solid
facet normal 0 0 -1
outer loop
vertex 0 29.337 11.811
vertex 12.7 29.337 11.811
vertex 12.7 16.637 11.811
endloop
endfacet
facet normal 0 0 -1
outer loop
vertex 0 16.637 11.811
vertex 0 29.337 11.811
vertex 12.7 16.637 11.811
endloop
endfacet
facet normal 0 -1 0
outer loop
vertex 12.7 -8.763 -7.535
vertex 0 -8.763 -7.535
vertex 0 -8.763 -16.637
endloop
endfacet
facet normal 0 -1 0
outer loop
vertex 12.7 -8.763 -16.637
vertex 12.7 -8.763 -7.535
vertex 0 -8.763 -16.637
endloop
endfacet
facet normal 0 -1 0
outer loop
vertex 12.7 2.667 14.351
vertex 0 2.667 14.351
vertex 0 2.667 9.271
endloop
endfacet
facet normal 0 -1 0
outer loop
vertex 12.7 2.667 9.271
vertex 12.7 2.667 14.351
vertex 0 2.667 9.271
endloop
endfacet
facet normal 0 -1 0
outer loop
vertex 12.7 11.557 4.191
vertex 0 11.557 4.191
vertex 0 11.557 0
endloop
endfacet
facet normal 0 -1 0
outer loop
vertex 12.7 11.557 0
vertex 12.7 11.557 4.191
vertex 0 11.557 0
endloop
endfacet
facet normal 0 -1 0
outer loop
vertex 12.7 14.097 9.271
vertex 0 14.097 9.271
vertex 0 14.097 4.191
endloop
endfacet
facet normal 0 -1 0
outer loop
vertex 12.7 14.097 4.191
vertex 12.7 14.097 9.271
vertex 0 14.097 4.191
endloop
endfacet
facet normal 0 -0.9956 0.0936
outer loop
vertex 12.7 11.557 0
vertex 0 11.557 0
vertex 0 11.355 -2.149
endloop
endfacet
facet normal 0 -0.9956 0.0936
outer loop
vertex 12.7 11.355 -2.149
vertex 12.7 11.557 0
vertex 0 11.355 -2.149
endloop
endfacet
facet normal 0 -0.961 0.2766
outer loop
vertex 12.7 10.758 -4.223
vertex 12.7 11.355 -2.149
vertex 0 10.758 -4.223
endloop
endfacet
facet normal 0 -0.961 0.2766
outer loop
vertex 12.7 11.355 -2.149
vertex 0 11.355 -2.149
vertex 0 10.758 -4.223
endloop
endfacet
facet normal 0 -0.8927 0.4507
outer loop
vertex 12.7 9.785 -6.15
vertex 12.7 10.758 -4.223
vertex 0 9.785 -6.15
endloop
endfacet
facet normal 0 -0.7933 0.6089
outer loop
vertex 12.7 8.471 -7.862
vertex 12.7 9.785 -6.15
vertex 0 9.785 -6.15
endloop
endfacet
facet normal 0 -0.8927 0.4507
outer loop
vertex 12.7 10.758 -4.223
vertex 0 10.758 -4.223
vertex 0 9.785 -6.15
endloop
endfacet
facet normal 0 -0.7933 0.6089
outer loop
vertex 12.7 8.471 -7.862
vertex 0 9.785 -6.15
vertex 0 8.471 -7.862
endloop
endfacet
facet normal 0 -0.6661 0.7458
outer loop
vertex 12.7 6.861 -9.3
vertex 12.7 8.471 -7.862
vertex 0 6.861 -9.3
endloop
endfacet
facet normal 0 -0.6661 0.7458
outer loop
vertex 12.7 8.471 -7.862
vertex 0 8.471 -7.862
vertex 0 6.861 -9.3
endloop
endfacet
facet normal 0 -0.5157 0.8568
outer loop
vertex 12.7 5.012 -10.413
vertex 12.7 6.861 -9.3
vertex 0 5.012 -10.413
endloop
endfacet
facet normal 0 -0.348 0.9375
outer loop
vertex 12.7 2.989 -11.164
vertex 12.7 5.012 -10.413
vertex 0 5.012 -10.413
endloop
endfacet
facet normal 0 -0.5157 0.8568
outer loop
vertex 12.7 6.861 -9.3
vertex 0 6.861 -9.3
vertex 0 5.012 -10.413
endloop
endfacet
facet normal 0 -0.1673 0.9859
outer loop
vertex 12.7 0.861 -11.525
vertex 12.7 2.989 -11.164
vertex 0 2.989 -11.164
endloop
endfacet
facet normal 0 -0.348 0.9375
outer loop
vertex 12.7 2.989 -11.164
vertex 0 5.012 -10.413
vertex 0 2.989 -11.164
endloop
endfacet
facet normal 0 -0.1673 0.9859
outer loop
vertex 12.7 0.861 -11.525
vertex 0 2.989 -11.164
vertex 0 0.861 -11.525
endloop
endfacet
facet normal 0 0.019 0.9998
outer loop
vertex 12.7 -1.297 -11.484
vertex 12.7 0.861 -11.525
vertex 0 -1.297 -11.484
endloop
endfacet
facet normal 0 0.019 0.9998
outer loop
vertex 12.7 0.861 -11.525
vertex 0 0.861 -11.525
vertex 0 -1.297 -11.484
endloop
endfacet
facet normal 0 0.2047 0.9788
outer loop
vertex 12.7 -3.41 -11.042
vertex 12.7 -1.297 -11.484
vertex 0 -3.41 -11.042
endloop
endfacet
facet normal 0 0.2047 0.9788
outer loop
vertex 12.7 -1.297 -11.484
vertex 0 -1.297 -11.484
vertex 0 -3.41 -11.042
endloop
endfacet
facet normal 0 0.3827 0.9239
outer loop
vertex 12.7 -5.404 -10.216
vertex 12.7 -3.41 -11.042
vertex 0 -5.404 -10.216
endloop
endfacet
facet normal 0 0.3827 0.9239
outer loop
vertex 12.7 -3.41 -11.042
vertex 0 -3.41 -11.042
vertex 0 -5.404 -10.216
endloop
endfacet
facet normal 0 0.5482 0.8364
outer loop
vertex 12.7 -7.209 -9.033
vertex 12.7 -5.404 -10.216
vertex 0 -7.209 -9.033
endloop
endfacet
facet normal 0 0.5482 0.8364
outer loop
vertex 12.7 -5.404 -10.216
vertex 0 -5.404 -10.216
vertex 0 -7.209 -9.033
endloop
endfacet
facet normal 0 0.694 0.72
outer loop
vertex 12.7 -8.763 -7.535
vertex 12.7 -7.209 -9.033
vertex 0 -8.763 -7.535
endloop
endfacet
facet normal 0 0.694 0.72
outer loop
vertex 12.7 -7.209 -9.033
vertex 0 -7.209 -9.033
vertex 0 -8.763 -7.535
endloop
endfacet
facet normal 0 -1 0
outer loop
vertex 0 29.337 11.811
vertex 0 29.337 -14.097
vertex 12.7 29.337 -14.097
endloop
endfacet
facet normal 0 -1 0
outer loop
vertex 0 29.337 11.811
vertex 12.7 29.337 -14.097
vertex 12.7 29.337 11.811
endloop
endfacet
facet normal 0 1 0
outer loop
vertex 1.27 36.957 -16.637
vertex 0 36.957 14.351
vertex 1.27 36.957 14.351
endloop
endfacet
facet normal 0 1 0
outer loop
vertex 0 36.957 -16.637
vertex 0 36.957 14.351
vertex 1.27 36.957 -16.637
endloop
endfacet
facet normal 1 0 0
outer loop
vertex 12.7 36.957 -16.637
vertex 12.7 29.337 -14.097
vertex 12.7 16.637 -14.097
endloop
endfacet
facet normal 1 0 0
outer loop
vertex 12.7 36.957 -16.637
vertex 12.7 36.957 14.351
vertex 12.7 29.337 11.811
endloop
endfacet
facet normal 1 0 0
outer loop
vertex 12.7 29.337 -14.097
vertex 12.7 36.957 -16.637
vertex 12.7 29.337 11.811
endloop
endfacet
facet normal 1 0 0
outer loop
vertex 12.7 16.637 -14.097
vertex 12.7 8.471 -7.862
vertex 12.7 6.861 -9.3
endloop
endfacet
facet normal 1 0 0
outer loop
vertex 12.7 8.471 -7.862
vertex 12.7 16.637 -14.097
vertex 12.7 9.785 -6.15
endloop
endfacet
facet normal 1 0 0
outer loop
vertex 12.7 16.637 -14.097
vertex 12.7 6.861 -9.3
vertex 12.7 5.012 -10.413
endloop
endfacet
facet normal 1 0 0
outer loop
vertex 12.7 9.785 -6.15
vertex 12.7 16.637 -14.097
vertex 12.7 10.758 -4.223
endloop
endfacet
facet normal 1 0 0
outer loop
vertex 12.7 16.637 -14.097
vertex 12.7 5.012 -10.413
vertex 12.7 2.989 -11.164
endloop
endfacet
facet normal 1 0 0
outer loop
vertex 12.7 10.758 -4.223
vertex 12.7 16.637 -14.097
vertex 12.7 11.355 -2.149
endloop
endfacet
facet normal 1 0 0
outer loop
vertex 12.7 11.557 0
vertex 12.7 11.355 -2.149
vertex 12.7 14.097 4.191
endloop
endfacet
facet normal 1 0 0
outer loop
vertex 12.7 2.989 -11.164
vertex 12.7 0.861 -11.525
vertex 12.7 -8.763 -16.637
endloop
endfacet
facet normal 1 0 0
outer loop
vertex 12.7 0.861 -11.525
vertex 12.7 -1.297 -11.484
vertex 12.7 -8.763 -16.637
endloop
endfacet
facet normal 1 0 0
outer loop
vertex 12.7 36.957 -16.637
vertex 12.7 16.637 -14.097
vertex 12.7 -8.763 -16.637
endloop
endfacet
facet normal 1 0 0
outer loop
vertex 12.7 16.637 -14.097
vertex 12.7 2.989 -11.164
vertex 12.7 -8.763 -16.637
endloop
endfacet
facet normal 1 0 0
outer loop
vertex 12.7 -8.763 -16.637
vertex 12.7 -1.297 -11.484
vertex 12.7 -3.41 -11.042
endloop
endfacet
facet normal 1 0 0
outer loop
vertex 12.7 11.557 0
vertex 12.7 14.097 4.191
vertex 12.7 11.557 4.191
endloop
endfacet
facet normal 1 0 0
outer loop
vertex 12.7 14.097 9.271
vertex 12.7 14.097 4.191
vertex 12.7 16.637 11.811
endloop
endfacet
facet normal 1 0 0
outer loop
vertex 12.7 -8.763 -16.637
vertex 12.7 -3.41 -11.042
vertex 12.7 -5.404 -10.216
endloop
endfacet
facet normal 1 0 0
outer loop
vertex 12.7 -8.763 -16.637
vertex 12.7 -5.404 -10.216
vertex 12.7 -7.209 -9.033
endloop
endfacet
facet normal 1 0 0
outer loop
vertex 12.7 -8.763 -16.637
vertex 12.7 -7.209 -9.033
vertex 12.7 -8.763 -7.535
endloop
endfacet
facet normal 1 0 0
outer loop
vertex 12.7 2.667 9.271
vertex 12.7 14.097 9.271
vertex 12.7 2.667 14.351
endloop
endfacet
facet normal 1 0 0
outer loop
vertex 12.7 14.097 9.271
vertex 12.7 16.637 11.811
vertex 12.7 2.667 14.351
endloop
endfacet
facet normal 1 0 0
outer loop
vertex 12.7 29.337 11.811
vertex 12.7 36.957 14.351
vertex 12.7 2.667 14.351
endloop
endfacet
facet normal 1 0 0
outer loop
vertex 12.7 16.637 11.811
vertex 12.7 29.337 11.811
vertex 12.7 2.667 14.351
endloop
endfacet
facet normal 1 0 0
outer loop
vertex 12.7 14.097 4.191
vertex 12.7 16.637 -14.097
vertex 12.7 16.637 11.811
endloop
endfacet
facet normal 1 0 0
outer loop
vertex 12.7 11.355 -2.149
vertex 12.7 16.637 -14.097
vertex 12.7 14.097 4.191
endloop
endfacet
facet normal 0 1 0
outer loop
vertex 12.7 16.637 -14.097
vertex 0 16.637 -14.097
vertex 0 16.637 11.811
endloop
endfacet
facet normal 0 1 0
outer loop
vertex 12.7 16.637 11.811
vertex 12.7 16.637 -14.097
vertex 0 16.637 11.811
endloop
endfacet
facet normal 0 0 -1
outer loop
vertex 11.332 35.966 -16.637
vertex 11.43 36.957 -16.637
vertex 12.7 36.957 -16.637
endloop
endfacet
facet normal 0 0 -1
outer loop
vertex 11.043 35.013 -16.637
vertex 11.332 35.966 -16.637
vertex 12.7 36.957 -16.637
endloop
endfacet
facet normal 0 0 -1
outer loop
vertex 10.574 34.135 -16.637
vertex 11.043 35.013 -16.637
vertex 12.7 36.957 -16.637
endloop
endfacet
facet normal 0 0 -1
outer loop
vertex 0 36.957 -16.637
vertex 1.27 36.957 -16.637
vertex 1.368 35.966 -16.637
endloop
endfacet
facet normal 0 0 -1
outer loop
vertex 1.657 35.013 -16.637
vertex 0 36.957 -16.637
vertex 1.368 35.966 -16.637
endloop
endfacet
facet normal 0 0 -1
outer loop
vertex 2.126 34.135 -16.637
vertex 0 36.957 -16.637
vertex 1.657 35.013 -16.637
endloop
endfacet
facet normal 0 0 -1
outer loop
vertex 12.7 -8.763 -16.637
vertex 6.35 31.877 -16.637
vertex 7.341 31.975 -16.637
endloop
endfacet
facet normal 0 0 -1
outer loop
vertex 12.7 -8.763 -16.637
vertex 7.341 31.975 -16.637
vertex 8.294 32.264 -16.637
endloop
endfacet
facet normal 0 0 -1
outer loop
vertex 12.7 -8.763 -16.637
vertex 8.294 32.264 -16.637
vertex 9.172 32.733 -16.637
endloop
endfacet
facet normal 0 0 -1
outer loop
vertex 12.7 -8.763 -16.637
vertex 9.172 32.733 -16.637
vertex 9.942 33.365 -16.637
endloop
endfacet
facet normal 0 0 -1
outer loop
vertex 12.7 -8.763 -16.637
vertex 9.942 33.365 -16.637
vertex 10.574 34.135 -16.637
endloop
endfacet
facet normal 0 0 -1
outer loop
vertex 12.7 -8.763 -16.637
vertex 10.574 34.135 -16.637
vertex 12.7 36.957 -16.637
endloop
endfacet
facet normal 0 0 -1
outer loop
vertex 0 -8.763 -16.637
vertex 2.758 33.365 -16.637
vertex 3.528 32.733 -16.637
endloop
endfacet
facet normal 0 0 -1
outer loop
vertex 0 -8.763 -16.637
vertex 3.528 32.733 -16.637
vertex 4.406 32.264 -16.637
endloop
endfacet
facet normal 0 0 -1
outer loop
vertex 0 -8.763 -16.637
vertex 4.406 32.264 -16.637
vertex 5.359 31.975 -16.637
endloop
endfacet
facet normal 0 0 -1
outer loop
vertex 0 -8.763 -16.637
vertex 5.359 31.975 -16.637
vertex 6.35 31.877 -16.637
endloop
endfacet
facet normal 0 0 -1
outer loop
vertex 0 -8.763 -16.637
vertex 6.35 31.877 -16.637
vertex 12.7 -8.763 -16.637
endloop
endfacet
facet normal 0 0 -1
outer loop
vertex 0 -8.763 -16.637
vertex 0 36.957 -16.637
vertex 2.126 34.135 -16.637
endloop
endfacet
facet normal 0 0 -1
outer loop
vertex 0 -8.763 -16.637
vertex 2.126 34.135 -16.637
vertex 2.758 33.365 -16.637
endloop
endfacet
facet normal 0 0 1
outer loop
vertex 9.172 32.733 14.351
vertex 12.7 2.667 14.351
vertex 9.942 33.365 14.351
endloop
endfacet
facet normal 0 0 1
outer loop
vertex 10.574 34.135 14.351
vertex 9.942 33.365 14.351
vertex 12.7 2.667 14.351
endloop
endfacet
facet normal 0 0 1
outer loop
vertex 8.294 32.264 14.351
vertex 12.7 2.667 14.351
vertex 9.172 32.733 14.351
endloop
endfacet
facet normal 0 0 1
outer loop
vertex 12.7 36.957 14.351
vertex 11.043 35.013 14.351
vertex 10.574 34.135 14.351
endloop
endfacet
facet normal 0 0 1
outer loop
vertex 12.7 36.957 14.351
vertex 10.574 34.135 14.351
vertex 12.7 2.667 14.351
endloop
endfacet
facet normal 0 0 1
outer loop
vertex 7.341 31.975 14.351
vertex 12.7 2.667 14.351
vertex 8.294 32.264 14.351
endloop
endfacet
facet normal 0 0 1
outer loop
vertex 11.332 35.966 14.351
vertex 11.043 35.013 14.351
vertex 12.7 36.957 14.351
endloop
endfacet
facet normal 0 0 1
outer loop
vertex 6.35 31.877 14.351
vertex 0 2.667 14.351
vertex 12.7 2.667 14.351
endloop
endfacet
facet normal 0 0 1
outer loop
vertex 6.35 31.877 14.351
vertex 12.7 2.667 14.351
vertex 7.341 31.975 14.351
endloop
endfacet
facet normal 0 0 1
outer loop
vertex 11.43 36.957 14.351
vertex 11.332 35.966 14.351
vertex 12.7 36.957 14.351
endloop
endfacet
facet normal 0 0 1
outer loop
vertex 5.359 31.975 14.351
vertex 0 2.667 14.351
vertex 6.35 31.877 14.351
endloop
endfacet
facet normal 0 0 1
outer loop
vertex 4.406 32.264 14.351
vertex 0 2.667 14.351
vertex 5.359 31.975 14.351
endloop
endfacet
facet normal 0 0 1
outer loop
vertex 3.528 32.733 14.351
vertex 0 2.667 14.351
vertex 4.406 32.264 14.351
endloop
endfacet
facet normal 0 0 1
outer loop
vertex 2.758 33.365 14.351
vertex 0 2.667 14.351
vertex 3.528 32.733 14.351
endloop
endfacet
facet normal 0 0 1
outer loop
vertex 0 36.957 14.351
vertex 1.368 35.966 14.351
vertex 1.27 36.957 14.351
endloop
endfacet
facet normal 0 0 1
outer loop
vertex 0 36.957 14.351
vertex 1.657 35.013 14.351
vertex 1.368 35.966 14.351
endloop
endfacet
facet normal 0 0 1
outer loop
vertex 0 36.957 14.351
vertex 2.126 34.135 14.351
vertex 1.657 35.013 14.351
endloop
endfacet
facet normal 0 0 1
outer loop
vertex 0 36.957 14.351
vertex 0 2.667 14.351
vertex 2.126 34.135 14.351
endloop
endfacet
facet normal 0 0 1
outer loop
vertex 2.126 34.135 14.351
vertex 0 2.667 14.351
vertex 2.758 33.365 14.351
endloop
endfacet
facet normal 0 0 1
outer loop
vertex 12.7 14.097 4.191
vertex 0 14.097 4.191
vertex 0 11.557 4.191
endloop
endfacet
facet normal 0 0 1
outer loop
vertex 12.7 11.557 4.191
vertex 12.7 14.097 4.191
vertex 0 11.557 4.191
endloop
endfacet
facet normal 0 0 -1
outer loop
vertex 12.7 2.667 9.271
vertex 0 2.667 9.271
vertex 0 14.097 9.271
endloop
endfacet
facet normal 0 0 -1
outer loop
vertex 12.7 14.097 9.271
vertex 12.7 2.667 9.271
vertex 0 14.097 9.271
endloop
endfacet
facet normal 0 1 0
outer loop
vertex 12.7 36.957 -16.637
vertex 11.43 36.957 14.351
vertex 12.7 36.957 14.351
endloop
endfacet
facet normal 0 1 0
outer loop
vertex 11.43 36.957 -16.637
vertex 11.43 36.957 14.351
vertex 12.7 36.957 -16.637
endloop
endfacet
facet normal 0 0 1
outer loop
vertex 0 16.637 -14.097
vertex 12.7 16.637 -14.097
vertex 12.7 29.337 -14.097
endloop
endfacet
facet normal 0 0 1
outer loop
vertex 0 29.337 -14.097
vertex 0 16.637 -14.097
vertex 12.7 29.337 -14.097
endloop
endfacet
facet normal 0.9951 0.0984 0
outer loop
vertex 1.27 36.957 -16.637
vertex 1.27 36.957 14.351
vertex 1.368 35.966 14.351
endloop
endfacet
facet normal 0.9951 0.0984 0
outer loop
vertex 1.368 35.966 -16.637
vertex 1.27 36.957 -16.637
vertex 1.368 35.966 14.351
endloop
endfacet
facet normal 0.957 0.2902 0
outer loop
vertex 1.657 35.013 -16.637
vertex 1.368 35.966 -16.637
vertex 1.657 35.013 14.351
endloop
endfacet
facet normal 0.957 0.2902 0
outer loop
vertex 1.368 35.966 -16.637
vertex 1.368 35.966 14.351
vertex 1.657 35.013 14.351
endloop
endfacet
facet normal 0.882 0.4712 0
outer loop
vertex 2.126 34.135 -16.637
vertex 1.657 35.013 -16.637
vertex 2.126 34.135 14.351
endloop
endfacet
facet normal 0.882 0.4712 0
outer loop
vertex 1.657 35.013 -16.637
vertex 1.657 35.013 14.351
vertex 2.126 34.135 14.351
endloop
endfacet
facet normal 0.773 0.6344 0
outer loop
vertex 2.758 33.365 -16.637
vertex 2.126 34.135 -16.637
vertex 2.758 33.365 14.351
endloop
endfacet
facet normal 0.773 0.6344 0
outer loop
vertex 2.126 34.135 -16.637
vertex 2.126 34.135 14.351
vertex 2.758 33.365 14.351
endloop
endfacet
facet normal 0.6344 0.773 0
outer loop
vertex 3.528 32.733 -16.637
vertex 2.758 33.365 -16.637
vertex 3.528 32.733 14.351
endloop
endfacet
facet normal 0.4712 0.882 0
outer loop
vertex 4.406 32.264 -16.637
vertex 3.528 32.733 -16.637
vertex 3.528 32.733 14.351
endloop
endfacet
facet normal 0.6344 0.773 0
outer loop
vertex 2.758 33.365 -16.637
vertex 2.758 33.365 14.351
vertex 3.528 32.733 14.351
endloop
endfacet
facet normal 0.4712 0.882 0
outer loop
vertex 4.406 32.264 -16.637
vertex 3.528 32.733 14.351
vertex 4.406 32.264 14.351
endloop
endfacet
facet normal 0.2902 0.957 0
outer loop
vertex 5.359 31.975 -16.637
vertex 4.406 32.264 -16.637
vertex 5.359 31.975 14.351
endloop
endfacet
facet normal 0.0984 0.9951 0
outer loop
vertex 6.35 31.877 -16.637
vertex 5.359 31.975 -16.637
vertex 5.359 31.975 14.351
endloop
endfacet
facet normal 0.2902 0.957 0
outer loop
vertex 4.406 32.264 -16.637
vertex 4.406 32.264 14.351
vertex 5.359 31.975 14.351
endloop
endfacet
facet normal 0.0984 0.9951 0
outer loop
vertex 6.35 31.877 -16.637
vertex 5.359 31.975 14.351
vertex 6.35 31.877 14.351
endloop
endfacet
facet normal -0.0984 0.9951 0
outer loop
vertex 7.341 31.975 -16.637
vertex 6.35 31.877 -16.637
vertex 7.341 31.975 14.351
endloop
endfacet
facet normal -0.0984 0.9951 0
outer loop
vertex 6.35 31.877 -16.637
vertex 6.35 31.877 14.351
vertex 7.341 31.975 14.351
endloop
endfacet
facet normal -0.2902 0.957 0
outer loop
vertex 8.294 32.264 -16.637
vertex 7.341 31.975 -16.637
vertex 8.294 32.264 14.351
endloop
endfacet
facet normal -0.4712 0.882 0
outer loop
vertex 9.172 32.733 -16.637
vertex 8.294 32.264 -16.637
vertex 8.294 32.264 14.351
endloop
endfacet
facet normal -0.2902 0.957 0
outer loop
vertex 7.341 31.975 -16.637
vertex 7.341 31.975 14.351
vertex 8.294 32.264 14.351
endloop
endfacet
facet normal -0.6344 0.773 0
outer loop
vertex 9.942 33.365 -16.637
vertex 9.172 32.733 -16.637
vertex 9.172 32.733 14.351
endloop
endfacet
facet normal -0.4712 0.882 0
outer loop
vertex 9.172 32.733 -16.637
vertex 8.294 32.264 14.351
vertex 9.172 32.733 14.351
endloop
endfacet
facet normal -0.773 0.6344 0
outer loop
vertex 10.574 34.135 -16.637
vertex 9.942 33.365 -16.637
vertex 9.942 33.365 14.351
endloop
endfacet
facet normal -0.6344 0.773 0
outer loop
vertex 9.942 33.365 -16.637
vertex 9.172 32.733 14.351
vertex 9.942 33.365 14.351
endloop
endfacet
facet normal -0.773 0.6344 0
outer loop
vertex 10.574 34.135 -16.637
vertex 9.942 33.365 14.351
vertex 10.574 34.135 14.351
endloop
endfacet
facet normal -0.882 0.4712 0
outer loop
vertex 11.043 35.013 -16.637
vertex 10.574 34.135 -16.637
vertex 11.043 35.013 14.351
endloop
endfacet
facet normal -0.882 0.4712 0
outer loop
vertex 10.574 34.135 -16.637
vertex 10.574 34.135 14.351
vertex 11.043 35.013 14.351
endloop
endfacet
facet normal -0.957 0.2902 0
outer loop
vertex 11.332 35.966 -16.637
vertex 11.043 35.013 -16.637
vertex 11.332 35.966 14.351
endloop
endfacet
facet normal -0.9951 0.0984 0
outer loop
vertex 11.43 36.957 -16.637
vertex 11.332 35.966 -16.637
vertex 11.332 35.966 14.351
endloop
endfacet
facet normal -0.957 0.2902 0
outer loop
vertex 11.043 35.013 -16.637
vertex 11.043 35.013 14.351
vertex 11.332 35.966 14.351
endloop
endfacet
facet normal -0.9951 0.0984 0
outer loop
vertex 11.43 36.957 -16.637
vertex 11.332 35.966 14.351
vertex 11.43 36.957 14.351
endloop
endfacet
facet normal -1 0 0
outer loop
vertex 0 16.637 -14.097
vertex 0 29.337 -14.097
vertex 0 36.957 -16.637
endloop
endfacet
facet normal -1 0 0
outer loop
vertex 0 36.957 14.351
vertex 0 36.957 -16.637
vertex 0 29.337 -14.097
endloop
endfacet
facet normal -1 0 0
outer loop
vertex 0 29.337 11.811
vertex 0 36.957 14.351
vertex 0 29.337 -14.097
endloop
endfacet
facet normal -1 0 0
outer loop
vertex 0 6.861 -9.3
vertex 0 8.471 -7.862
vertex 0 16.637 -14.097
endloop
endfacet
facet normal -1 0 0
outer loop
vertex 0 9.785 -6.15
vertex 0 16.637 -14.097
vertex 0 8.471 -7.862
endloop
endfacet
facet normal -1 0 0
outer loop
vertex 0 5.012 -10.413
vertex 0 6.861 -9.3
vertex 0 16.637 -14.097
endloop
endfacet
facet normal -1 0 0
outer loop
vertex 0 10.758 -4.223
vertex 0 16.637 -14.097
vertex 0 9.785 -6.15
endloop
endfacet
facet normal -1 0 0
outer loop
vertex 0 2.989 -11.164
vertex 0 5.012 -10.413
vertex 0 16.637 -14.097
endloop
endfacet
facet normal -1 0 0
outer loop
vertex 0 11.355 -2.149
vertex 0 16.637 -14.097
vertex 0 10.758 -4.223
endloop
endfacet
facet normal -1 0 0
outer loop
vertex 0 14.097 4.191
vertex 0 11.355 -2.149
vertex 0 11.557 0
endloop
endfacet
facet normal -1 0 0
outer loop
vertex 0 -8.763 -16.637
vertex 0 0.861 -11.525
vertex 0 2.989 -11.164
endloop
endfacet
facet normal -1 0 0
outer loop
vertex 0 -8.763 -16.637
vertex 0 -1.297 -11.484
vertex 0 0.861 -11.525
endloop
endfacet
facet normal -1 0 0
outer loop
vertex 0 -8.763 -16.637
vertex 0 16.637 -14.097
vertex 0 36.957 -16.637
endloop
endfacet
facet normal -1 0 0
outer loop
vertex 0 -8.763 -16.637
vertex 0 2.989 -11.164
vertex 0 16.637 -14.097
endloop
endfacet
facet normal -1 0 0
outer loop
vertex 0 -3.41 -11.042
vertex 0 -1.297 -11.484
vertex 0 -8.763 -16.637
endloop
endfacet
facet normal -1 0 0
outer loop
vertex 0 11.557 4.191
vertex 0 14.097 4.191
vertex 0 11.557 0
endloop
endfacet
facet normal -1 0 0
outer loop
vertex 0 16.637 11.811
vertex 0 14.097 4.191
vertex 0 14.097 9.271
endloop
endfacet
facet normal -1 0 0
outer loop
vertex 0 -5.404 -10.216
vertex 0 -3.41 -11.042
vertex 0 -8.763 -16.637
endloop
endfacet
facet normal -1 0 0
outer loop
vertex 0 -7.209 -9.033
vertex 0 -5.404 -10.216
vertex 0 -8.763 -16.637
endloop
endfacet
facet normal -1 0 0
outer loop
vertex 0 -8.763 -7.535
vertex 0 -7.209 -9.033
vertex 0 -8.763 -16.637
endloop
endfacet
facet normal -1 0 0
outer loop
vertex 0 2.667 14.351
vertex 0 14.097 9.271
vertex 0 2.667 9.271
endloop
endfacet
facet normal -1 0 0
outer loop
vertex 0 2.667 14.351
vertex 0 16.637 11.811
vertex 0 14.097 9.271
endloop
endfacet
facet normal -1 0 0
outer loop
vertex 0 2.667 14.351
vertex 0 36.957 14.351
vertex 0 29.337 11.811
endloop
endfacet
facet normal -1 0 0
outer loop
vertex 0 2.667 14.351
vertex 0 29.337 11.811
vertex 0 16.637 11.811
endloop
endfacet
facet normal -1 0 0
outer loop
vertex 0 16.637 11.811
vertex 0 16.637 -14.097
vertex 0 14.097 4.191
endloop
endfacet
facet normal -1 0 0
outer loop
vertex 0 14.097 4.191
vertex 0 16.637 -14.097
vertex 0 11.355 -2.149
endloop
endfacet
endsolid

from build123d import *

# Parameters (mm, degrees)
F1_DEPTH = 12.7
F3_DEPTH = 12.7
F5_DEPTH = 76.2


with BuildPart() as f1:
    # F0 (on Right) → F1 (new body)
    with BuildSketch(Plane.YZ):
        with BuildLine():
            ThreePointArc((11.557, 0), (4.0181, -10.83601), (-8.763, -7.534858))
            Line((-8.763, -7.534858), (-8.763, -16.637))
            Line((-8.763, -16.637), (11.557, -16.637))
            Line((11.557, -16.637), (16.637, -16.637))
            Line((16.637, -16.637), (16.637, 14.351))
            Line((16.637, 14.351), (2.667, 14.351))
            Line((2.667, 14.351), (2.667, 9.271))
            Line((2.667, 9.271), (11.557, 9.271))
            Line((11.557, 9.271), (14.097, 9.271))
            Line((14.097, 9.271), (14.097, 4.191))
            Line((14.097, 4.191), (11.557, 4.191))
            Line((11.557, 4.191), (11.557, 0))
        make_face()
    extrude(amount=F1_DEPTH)

    # F2 (on face) → F3 (join)
    with BuildSketch(Plane(origin=(0, 0, 0), x_dir=(0, -1, 0), z_dir=(-1, 0, 0))):
        Polygon((-16.637, 11.811), (-16.637, 14.351), (-36.957, 14.351), (-36.957, -16.637), (-16.637, -16.637), (-16.637, -14.097), (-29.337, -14.097), (-29.337, 11.811), align=None)
    extrude(amount=-F3_DEPTH)

    # F4 (on face) → F5 (cut)
    with BuildSketch(Plane.XY.offset(14.351)):
        with BuildLine():
            ThreePointArc((1.27, 36.957), (6.35, 31.877), (11.43, 36.957))
            Line((11.43, 36.957), (1.27, 36.957))
        make_face()
        with BuildLine():
            Line((1.27, 36.957), (11.43, 36.957))
            ThreePointArc((11.43, 36.957), (6.35, 42.037), (1.27, 36.957))
        make_face()
    extrude(amount=-F5_DEPTH, mode=Mode.SUBTRACT)


solid = f1.part
